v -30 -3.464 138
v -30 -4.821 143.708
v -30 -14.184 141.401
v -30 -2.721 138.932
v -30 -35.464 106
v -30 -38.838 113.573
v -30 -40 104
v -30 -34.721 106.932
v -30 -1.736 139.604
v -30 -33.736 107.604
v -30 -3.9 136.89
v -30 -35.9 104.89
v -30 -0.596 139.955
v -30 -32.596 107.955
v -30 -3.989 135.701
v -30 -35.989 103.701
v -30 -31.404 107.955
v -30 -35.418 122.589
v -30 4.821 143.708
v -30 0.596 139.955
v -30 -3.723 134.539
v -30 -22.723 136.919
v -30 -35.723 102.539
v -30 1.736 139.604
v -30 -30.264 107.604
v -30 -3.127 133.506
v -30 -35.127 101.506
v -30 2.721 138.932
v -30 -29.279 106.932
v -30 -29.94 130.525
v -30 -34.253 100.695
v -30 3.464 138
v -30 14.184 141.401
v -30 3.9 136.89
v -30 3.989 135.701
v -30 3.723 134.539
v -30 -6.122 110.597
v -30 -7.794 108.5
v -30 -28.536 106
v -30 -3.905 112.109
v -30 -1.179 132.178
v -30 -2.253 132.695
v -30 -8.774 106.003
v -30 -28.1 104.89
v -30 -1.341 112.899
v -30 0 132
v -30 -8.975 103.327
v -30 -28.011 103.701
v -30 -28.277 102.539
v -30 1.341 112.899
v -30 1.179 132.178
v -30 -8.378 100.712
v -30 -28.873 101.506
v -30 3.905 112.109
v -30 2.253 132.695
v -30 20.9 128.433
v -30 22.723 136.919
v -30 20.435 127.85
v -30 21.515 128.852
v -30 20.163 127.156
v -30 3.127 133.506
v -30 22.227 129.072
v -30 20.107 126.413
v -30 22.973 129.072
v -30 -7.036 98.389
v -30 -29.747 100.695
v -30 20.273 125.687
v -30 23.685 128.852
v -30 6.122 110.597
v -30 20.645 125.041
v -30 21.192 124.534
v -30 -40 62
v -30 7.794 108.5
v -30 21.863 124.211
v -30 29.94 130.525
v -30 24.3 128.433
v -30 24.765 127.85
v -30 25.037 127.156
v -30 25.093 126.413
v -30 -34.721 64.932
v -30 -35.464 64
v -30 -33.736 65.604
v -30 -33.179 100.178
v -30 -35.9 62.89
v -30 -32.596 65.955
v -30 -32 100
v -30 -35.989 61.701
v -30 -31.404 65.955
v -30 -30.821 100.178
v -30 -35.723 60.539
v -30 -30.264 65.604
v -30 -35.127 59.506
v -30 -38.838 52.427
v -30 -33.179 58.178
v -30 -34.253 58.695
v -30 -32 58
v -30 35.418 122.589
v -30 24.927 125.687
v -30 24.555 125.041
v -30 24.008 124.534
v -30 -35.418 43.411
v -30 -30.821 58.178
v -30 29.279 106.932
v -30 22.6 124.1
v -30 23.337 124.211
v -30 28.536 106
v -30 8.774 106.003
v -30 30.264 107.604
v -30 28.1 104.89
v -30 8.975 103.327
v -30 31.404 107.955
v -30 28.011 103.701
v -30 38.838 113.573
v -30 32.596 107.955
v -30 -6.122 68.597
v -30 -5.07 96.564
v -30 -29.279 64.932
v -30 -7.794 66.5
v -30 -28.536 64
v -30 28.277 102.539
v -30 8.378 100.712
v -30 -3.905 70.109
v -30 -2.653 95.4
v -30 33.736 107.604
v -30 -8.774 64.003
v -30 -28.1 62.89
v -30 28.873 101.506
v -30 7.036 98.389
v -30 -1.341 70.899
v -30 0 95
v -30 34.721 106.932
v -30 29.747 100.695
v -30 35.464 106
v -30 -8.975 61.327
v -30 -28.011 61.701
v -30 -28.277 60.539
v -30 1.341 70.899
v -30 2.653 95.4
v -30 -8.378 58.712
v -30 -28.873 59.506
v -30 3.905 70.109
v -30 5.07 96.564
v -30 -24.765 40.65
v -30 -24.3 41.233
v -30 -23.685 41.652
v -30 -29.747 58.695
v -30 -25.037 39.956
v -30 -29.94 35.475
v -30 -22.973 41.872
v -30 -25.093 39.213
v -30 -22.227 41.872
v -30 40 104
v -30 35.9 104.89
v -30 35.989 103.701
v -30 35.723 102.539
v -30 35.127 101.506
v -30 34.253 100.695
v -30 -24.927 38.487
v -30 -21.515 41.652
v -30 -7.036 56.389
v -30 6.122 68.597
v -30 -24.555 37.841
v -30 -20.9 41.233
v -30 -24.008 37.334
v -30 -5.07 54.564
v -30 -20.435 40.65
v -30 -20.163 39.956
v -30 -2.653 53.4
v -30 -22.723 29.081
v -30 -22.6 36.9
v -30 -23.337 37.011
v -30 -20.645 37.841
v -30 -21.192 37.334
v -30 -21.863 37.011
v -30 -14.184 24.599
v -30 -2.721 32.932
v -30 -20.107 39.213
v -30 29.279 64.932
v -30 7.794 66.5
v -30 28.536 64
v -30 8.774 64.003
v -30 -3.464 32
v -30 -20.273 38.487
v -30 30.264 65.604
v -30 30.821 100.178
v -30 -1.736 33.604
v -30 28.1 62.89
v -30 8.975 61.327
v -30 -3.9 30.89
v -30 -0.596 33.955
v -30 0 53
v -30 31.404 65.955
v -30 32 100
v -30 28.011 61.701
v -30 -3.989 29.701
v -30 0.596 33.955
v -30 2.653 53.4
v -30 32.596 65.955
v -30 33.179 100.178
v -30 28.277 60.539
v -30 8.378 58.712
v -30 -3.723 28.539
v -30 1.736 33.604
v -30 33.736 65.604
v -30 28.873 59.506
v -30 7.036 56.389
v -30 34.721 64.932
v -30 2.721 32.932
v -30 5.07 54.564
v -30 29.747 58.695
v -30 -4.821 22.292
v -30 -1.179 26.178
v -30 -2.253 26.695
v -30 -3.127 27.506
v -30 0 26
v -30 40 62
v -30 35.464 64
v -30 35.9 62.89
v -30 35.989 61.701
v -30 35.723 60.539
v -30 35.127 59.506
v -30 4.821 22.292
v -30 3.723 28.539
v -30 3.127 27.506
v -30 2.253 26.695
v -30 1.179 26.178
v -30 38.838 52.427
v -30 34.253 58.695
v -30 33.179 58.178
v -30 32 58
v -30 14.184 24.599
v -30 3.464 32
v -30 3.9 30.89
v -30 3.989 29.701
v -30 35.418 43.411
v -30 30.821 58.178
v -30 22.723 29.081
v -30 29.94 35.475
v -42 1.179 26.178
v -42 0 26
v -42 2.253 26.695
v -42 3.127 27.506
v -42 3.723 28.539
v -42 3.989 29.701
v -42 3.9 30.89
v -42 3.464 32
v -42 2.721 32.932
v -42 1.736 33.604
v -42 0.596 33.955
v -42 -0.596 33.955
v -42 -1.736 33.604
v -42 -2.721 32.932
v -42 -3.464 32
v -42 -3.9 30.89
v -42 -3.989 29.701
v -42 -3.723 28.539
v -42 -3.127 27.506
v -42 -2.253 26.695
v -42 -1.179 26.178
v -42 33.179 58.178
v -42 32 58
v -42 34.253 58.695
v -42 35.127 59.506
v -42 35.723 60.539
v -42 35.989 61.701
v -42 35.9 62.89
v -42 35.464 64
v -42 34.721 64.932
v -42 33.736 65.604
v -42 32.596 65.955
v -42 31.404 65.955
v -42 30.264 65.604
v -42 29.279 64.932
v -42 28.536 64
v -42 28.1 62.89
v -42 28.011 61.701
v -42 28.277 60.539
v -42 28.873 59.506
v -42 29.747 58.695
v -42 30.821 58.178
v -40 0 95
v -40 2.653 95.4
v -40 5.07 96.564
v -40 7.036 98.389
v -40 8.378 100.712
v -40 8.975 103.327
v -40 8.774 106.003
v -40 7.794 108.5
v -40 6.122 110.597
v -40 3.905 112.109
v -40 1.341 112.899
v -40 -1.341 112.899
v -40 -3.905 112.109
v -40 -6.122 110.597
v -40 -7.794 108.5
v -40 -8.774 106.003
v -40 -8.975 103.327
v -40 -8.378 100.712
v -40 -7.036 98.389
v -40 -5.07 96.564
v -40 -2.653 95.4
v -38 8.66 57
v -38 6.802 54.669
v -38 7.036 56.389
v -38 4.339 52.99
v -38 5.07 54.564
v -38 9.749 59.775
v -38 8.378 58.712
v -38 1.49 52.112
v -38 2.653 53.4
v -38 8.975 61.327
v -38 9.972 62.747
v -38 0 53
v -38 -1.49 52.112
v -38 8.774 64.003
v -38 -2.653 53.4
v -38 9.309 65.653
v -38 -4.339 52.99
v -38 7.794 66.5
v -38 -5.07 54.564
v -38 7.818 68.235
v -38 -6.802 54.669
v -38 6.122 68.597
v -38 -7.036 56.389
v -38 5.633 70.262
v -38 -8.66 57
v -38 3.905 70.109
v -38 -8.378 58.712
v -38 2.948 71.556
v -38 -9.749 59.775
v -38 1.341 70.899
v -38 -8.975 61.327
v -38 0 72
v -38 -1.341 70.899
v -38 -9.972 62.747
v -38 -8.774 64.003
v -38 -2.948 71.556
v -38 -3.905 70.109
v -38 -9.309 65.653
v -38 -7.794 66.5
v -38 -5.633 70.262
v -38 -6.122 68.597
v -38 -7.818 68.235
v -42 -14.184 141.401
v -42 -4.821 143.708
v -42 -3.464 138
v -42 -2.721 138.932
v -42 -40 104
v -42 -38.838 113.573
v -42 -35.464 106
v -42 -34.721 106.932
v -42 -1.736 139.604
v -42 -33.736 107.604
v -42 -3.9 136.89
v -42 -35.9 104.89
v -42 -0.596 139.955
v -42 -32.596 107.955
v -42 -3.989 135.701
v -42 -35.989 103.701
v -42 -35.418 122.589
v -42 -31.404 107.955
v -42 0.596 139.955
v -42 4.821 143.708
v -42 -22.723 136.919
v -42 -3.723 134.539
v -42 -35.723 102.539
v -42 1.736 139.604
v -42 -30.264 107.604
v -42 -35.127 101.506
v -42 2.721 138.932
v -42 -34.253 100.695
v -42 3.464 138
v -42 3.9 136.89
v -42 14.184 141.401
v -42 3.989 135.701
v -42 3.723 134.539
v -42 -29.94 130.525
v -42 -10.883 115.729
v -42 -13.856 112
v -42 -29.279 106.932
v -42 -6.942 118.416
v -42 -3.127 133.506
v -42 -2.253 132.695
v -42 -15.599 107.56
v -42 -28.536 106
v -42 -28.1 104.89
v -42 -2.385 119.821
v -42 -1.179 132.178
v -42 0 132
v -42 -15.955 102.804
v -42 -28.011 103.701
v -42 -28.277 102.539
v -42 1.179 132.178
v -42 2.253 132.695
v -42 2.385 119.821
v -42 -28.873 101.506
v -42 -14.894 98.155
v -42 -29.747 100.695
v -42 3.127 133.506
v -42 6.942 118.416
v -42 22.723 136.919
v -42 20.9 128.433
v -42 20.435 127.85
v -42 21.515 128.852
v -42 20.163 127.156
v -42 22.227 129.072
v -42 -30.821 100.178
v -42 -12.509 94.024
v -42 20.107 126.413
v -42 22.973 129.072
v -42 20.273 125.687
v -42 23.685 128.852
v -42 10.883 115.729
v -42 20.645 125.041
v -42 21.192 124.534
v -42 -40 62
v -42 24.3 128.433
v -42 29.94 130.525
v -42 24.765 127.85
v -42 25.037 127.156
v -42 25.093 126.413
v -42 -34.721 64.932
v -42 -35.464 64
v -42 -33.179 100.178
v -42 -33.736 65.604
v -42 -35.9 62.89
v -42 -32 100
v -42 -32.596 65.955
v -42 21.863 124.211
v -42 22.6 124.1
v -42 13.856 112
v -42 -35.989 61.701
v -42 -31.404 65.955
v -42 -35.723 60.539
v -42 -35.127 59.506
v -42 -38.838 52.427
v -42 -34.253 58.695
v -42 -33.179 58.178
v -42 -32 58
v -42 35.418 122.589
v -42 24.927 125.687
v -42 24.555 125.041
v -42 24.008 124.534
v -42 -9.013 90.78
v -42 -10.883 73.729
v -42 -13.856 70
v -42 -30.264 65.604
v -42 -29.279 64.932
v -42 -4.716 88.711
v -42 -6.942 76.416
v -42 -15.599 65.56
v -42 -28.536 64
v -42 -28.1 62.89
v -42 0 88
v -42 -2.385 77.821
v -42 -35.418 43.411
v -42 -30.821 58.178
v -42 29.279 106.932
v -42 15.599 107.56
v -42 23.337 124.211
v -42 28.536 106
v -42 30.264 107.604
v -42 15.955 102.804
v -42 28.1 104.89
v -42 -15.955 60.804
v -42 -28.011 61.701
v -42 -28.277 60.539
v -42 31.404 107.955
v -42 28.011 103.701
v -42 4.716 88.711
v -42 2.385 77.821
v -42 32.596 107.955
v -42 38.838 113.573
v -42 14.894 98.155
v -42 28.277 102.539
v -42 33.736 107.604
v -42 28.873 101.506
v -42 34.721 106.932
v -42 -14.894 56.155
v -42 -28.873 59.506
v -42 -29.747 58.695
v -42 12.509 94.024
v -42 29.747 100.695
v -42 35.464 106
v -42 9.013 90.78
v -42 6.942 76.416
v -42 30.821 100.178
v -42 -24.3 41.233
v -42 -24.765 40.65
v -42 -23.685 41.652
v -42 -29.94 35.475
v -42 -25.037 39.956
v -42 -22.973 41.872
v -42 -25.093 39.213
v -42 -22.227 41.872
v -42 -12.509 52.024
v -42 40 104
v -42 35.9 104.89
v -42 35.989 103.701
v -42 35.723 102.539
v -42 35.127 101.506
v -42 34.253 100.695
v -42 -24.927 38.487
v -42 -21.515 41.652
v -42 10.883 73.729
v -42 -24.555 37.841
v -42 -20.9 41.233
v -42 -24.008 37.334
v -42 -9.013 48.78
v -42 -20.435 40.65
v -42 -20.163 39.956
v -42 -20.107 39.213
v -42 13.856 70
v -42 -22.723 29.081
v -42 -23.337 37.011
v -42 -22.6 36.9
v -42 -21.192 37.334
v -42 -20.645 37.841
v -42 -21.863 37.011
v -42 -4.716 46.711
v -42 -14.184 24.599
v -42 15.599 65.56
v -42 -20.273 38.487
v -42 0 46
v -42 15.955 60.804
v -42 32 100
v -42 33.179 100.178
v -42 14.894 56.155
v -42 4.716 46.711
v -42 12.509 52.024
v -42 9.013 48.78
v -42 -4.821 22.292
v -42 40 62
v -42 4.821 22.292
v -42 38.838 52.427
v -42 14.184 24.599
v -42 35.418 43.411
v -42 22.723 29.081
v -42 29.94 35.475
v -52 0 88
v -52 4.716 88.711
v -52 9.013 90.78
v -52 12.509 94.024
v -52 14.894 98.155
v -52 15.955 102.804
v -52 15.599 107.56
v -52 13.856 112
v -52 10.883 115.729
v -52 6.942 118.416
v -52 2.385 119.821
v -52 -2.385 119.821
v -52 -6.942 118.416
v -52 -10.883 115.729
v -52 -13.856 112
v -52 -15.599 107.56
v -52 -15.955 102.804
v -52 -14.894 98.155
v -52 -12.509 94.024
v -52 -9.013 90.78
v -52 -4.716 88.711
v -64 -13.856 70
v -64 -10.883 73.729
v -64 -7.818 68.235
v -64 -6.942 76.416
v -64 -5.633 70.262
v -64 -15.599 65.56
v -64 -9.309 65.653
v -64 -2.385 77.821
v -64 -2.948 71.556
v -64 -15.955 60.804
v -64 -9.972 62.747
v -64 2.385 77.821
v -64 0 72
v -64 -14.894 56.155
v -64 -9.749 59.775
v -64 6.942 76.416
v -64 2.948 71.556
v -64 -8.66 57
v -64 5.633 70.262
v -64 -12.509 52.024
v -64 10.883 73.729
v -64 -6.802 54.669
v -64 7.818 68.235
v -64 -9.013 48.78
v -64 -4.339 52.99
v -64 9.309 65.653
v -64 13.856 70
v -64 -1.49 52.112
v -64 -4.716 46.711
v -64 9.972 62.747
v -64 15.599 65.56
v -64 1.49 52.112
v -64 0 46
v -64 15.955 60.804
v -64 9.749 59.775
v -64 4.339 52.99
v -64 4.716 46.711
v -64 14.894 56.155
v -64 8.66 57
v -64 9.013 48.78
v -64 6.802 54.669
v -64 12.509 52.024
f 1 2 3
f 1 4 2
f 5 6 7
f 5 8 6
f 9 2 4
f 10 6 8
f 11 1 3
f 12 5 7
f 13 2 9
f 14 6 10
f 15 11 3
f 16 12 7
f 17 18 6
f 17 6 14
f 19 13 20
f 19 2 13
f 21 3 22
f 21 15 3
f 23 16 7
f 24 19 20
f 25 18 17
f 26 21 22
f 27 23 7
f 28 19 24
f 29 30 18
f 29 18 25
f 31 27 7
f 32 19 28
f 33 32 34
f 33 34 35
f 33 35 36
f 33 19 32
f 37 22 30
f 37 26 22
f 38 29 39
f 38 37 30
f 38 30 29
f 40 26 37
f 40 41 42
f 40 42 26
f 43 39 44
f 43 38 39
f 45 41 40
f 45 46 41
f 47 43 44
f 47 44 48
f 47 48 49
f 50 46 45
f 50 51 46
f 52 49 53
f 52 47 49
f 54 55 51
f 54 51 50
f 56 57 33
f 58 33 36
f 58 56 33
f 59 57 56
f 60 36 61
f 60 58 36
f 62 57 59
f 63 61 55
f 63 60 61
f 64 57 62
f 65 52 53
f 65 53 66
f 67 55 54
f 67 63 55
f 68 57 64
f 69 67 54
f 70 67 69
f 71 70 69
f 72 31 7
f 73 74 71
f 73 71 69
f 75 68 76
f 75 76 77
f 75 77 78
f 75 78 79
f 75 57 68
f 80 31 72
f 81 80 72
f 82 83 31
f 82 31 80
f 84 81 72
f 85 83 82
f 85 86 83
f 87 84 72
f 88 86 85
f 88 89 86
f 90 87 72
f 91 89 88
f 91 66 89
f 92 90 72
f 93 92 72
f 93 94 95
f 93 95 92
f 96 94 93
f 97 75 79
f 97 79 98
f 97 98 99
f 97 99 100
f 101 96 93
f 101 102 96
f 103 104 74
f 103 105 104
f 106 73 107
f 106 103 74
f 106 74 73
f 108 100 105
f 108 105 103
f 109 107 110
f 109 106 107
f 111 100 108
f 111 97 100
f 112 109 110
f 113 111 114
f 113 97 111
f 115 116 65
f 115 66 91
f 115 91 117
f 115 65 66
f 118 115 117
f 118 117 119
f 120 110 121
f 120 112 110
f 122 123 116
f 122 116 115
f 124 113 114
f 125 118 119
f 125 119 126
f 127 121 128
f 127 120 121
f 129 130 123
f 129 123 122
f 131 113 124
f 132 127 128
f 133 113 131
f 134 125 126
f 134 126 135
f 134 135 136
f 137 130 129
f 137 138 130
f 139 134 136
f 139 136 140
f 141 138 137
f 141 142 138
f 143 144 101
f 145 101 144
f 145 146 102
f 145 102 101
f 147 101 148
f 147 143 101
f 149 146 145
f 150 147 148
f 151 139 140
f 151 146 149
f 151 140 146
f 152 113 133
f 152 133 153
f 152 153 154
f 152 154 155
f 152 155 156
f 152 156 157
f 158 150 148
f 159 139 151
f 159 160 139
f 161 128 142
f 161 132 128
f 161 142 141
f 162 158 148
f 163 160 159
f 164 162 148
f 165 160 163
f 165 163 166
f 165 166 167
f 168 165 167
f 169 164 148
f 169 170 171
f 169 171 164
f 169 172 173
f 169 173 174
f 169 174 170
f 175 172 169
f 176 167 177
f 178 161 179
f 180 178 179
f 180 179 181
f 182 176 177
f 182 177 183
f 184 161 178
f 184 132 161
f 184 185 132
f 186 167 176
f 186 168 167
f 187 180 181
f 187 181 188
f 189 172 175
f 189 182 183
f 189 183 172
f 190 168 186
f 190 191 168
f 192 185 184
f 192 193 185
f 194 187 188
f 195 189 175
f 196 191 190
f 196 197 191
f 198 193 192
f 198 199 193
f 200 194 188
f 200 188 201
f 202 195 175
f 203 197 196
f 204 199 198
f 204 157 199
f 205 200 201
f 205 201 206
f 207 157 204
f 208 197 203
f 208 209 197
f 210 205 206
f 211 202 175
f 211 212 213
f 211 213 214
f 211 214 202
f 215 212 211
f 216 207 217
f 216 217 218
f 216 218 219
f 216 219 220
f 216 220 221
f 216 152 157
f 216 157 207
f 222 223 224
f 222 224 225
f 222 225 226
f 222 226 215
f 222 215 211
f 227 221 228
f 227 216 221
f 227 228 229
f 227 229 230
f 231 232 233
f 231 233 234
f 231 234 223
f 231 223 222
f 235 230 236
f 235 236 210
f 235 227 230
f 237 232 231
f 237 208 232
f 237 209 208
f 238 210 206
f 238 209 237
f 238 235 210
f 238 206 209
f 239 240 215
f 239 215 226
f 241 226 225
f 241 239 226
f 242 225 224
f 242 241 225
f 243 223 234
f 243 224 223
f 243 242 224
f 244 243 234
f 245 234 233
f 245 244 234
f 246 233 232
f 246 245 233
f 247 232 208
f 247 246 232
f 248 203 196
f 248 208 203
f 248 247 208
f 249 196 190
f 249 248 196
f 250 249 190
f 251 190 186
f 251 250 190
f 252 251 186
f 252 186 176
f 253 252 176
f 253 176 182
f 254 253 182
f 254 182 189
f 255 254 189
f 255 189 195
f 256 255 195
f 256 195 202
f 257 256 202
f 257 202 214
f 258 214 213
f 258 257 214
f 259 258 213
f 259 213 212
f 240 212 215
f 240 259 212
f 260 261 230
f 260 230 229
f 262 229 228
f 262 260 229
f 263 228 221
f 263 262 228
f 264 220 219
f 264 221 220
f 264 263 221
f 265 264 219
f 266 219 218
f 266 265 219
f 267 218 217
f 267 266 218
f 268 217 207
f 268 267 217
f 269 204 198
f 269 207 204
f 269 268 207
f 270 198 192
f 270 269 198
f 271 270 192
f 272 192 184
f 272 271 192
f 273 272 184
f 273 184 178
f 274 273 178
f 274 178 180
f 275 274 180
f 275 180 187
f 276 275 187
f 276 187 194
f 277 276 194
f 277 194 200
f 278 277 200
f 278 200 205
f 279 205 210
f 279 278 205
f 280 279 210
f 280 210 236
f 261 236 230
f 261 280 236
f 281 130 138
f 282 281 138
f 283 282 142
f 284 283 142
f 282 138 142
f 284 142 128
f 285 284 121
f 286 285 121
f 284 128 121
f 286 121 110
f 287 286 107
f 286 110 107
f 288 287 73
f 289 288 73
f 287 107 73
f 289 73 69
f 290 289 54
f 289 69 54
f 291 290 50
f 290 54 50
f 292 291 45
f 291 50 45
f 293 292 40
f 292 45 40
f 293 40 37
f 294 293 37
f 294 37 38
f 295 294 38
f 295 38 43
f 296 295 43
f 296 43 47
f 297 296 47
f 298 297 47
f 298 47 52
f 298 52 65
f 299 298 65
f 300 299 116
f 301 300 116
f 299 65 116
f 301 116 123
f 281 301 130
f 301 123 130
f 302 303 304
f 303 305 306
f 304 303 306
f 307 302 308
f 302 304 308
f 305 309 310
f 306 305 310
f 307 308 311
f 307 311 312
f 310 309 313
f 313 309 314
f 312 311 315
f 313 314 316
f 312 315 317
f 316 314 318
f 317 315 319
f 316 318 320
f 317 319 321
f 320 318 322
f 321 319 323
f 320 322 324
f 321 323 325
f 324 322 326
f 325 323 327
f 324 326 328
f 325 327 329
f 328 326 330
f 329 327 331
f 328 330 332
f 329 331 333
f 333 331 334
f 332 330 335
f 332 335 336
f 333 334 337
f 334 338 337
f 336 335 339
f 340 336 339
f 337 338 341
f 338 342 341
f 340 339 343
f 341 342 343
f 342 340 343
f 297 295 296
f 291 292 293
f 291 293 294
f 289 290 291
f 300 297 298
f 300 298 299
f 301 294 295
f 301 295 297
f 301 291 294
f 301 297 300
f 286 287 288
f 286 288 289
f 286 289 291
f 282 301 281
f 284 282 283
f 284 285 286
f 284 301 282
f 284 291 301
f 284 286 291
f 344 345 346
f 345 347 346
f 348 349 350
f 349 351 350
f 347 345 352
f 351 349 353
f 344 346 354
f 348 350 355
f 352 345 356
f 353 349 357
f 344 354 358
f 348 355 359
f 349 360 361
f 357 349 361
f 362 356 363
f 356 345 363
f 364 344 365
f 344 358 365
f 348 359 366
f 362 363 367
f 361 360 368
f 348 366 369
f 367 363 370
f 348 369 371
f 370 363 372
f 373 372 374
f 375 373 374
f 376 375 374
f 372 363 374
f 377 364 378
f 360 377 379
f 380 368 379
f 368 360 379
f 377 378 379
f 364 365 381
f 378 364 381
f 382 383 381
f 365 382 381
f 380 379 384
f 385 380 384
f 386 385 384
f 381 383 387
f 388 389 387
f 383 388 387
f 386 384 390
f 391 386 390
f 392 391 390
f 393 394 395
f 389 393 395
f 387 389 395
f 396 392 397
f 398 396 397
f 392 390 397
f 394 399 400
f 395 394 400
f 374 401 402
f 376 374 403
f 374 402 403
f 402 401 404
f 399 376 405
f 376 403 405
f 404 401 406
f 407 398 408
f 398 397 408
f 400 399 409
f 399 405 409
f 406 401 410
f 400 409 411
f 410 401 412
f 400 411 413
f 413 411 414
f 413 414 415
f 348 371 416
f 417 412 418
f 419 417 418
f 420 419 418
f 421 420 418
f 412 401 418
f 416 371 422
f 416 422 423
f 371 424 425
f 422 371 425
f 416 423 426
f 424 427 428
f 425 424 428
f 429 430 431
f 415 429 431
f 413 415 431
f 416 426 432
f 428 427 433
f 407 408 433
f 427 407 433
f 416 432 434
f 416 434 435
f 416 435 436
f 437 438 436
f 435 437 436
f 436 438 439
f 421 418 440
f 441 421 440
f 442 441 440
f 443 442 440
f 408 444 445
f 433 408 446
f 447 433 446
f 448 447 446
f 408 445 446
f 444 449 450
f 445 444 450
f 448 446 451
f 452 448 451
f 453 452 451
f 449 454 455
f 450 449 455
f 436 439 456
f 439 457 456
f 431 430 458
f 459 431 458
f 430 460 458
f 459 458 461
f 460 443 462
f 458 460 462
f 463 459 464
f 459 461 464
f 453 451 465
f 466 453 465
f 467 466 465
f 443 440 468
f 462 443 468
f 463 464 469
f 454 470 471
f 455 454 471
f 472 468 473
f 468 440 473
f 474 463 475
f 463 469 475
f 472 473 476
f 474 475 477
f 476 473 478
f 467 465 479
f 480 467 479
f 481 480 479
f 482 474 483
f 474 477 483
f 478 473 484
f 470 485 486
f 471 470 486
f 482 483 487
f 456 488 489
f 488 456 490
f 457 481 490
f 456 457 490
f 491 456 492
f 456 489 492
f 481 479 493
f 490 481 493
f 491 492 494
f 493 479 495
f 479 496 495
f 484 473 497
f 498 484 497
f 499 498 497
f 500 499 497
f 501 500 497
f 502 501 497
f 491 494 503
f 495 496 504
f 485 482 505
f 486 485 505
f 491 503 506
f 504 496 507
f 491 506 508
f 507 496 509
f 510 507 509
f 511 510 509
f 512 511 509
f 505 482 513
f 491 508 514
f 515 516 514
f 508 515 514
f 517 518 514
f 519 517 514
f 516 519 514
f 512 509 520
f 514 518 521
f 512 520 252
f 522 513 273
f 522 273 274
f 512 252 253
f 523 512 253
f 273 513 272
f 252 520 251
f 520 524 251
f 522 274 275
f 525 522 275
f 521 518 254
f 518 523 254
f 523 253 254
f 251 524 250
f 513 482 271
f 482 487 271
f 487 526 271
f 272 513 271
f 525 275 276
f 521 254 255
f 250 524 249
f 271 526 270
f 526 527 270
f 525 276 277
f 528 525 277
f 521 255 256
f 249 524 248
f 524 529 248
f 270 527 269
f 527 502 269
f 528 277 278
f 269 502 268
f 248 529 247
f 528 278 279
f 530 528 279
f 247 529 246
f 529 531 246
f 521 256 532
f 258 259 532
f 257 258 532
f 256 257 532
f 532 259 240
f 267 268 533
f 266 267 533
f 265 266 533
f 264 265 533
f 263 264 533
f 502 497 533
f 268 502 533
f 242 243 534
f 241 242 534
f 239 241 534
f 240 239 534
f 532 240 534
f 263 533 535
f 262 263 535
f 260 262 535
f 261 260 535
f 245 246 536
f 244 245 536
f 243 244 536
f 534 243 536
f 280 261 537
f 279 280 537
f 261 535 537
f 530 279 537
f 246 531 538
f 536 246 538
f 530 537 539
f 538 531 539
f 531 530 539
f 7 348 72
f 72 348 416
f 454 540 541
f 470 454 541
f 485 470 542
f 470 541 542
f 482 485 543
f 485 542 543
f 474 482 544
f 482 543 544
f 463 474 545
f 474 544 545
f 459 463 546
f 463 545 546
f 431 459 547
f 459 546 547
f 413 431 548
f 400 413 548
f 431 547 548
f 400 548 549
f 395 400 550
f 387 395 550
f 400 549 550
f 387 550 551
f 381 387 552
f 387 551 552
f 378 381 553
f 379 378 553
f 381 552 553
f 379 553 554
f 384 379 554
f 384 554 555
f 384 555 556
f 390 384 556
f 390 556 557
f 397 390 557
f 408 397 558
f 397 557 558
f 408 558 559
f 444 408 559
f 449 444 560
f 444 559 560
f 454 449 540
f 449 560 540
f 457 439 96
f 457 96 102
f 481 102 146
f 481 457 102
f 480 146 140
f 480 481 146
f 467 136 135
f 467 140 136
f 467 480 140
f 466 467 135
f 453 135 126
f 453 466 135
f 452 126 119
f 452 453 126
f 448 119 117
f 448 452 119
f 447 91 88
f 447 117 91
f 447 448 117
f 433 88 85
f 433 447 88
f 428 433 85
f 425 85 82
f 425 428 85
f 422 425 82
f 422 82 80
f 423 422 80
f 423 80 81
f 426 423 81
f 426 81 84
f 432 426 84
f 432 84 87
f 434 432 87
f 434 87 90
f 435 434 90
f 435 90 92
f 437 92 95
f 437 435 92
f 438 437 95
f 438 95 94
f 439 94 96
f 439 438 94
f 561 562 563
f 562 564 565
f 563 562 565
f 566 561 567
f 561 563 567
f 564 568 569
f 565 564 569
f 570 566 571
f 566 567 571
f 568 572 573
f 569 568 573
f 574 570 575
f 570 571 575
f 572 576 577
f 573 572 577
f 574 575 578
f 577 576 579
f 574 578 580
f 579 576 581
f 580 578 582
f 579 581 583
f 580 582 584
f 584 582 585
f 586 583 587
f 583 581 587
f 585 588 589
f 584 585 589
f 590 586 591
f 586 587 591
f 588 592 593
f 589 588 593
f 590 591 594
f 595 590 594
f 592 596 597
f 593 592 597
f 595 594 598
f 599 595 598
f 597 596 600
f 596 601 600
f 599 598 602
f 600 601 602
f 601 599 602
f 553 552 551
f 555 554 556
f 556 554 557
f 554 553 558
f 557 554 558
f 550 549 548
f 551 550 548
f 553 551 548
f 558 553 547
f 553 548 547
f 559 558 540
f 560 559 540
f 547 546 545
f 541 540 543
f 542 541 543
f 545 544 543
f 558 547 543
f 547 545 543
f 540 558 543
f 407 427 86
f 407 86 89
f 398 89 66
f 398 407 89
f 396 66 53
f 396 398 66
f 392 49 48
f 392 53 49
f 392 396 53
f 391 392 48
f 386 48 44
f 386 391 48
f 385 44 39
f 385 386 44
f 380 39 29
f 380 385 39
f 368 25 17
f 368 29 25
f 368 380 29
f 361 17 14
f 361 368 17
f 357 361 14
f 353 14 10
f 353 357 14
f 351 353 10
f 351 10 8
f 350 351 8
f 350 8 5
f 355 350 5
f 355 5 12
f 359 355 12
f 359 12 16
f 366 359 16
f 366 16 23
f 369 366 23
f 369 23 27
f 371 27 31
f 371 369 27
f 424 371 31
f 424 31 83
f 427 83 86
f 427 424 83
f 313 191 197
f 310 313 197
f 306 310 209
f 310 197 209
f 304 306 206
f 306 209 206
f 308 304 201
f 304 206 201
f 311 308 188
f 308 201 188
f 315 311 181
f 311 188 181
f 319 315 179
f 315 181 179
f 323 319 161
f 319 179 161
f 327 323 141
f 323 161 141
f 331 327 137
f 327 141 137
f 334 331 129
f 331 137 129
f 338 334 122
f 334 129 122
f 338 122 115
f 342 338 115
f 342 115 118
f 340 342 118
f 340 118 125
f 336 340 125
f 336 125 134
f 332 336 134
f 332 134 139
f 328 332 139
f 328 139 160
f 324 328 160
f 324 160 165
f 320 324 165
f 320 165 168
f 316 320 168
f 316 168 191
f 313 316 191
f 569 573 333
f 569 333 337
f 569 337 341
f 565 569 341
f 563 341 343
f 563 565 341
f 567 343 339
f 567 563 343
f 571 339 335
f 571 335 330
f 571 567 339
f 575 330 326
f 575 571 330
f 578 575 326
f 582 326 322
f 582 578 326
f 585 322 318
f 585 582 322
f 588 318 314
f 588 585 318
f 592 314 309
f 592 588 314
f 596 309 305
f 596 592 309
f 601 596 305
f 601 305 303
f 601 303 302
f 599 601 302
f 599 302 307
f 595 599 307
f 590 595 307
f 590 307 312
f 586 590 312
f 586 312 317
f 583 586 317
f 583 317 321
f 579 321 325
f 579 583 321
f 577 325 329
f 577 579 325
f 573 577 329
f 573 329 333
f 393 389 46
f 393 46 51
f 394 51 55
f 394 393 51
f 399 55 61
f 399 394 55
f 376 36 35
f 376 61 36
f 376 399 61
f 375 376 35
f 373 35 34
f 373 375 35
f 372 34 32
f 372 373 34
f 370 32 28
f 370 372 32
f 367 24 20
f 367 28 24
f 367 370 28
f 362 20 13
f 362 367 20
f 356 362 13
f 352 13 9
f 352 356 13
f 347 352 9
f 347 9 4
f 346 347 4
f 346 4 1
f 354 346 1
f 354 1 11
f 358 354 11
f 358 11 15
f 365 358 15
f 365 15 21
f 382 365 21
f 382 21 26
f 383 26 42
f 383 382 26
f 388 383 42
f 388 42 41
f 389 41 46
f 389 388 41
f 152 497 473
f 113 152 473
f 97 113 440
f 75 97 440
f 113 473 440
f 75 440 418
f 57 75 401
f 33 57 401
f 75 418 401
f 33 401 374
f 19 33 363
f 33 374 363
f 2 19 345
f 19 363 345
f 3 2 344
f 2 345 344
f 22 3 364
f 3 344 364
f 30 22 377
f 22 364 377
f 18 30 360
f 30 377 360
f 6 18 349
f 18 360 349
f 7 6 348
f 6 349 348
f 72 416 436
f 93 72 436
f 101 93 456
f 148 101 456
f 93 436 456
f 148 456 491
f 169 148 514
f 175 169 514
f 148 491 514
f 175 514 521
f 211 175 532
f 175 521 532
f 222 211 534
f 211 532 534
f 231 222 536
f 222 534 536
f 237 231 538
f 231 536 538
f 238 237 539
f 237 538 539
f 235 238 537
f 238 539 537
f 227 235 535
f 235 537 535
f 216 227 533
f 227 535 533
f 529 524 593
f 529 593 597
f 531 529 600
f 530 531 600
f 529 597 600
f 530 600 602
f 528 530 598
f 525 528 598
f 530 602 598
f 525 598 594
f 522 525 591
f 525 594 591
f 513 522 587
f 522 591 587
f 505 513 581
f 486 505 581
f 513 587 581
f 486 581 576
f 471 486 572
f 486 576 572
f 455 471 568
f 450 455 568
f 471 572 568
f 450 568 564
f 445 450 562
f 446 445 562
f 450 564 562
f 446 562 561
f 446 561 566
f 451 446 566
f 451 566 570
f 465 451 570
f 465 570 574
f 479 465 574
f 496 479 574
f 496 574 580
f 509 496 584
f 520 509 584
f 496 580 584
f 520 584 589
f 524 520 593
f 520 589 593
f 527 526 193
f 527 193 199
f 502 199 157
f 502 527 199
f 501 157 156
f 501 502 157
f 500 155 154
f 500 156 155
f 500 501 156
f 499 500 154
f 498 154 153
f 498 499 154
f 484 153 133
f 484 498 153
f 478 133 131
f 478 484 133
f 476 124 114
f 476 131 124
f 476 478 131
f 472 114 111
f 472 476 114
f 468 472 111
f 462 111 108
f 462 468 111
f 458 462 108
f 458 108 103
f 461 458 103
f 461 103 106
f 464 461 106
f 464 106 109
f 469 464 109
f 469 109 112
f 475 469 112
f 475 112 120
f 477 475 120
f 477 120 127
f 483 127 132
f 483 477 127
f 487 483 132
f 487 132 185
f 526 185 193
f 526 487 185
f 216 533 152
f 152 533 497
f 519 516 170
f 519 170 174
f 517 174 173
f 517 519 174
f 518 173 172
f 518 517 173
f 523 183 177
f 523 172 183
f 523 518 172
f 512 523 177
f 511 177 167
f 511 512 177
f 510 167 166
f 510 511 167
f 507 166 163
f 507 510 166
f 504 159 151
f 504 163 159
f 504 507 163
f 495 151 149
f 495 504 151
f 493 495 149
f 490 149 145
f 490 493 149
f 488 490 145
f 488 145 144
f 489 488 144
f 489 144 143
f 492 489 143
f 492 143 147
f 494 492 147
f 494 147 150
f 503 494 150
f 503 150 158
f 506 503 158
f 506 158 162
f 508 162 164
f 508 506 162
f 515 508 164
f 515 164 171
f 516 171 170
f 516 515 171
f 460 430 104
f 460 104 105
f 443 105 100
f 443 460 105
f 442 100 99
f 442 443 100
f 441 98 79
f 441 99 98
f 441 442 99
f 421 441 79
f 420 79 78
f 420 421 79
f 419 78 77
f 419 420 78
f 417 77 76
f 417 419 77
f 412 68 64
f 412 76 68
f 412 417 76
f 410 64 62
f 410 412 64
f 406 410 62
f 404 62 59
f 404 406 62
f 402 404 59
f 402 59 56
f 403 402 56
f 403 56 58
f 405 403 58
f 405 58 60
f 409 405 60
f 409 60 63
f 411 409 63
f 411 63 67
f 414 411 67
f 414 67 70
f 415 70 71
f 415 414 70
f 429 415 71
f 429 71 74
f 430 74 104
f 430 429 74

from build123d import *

# Parameters (mm, degrees)
F_01_FLANGE_DEPTH    = 12
SKETCH_2_R           = 16
F_02_BOSS_UP_DEPTH   = 10
SKETCH_3_R           = 16
F_03_BOSS_LO_DEPTH   = 22
SKETCH_4_R           = 9
F_04_BORE_UP_DEPTH   = 10
SKETCH_5_R           = 9
F_05_BORE_LO_DEPTH   = 10
SKETCH_6_R           = 10
F_06_RV_CAVITY_DEPTH = 26
SKETCH_8_R           = 4
F_08_BOLT_0_DEPTH    = 14
SKETCH_9_R           = 4
F_08_BOLT_1_DEPTH    = 14
SKETCH_10_R          = 4
F_08_BOLT_2_DEPTH    = 14
SKETCH_11_R          = 4
F_08_BOLT_3_DEPTH    = 14
SKETCH_12_R          = 4
F_08_BOLT_4_DEPTH    = 14
SKETCH_13_R          = 4
F_08_BOLT_5_DEPTH    = 14
SKETCH_14_R          = 2.5
F_09_DOWEL_0_DEPTH   = 14
SKETCH_15_R          = 2.5
F_09_DOWEL_1_DEPTH   = 14


with BuildPart() as part:
    # 草图1 → 01_FLANGE (new body)
    with BuildSketch(Plane(origin=(-42, 0, 0), x_dir=(0, 0, -1), z_dir=(1, 0, 0))):
        with BuildLine():
            Line((-104, -40), (-62, -40))
            ThreePointArc((-62, -40), (-22, 0), (-62, 40))
            Line((-62, 40), (-104, 40))
            ThreePointArc((-104, 40), (-144, 0), (-104, -40))
        make_face()
    extrude(amount=F_01_FLANGE_DEPTH)

    # 草图2 → 02_BOSS_UP (add)
    with BuildSketch(Plane(origin=(-52, 0, 0), x_dir=(0, 0, -1), z_dir=(1, 0, 0))):
        with Locations((-104, 0)):
            Circle(SKETCH_2_R)
    extrude(amount=F_02_BOSS_UP_DEPTH)

    # 草图3 → 03_BOSS_LO (add)
    with BuildSketch(Plane(origin=(-64, 0, 0), x_dir=(0, 0, -1), z_dir=(1, 0, 0))):
        with Locations((-62, 0)):
            Circle(SKETCH_3_R)
    extrude(amount=F_03_BOSS_LO_DEPTH)

    # 草图4 → 04_BORE_UP (cut)
    with BuildSketch(Plane(origin=(-30, 0, 0), x_dir=(0, 0, -1), z_dir=(1, 0, 0))):
        with Locations((-104, 0)):
            Circle(SKETCH_4_R)
    extrude(amount=-F_04_BORE_UP_DEPTH, mode=Mode.SUBTRACT)

    # 草图5 → 05_BORE_LO (cut)
    with BuildSketch(Plane(origin=(-30, 0, 0), x_dir=(0, 0, -1), z_dir=(1, 0, 0))):
        with Locations((-62, 0)):
            Circle(SKETCH_5_R)
    extrude(amount=-F_05_BORE_LO_DEPTH, mode=Mode.SUBTRACT)

    # 草图6 → 06_RV_CAVITY (cut)
    with BuildSketch(Plane(origin=(-64, 0, 0), x_dir=(0, 0, -1), z_dir=(1, 0, 0))):
        with Locations(Location((-62, 0, 0), (0, 0, 180))):
            Circle(SKETCH_6_R)
    extrude(amount=F_06_RV_CAVITY_DEPTH, mode=Mode.SUBTRACT)

    # 草图8 → 08_BOLT_0 (cut)
    with BuildSketch(Plane(origin=(-43, 0, 0), x_dir=(0, 0, -1), z_dir=(1, 0, 0))):
        with Locations((-104, 32)):
            Circle(SKETCH_8_R)
    extrude(amount=F_08_BOLT_0_DEPTH, mode=Mode.SUBTRACT)

    # 草图9 → 08_BOLT_1 (cut)
    with BuildSketch(Plane(origin=(-43, 0, 0), x_dir=(0, 0, -1), z_dir=(1, 0, 0))):
        with Locations((-104, -32)):
            Circle(SKETCH_9_R)
    extrude(amount=F_08_BOLT_1_DEPTH, mode=Mode.SUBTRACT)

    # 草图10 → 08_BOLT_2 (cut)
    with BuildSketch(Plane(origin=(-43, 0, 0), x_dir=(0, 0, -1), z_dir=(1, 0, 0))):
        with Locations((-62, 32)):
            Circle(SKETCH_10_R)
    extrude(amount=F_08_BOLT_2_DEPTH, mode=Mode.SUBTRACT)

    # 草图11 → 08_BOLT_3 (cut)
    with BuildSketch(Plane(origin=(-43, 0, 0), x_dir=(0, 0, -1), z_dir=(1, 0, 0))):
        with Locations((-62, -32)):
            Circle(SKETCH_11_R)
    extrude(amount=F_08_BOLT_3_DEPTH, mode=Mode.SUBTRACT)

    # 草图12 → 08_BOLT_4 (cut)
    with BuildSketch(Plane(origin=(-43, 0, 0), x_dir=(0, 0, -1), z_dir=(1, 0, 0))):
        with Locations((-136, 0)):
            Circle(SKETCH_12_R)
    extrude(amount=F_08_BOLT_4_DEPTH, mode=Mode.SUBTRACT)

    # 草图13 → 08_BOLT_5 (cut)
    with BuildSketch(Plane(origin=(-43, 0, 0), x_dir=(0, 0, -1), z_dir=(1, 0, 0))):
        with Locations((-30, 0)):
            Circle(SKETCH_13_R)
    extrude(amount=F_08_BOLT_5_DEPTH, mode=Mode.SUBTRACT)

    # 草图14 → 09_DOWEL_0 (cut)
    with BuildSketch(Plane(origin=(-43, 0, 0), x_dir=(0, 0, -1), z_dir=(1, 0, 0))):
        with Locations((-126.6, 22.6)):
            Circle(SKETCH_14_R)
    extrude(amount=F_09_DOWEL_0_DEPTH, mode=Mode.SUBTRACT)

    # 草图15 → 09_DOWEL_1 (cut)
    with BuildSketch(Plane(origin=(-43, 0, 0), x_dir=(0, 0, -1), z_dir=(1, 0, 0))):
        with Locations((-39.4, -22.6)):
            Circle(SKETCH_15_R)
    extrude(amount=F_09_DOWEL_1_DEPTH, mode=Mode.SUBTRACT)


solid = part.part
